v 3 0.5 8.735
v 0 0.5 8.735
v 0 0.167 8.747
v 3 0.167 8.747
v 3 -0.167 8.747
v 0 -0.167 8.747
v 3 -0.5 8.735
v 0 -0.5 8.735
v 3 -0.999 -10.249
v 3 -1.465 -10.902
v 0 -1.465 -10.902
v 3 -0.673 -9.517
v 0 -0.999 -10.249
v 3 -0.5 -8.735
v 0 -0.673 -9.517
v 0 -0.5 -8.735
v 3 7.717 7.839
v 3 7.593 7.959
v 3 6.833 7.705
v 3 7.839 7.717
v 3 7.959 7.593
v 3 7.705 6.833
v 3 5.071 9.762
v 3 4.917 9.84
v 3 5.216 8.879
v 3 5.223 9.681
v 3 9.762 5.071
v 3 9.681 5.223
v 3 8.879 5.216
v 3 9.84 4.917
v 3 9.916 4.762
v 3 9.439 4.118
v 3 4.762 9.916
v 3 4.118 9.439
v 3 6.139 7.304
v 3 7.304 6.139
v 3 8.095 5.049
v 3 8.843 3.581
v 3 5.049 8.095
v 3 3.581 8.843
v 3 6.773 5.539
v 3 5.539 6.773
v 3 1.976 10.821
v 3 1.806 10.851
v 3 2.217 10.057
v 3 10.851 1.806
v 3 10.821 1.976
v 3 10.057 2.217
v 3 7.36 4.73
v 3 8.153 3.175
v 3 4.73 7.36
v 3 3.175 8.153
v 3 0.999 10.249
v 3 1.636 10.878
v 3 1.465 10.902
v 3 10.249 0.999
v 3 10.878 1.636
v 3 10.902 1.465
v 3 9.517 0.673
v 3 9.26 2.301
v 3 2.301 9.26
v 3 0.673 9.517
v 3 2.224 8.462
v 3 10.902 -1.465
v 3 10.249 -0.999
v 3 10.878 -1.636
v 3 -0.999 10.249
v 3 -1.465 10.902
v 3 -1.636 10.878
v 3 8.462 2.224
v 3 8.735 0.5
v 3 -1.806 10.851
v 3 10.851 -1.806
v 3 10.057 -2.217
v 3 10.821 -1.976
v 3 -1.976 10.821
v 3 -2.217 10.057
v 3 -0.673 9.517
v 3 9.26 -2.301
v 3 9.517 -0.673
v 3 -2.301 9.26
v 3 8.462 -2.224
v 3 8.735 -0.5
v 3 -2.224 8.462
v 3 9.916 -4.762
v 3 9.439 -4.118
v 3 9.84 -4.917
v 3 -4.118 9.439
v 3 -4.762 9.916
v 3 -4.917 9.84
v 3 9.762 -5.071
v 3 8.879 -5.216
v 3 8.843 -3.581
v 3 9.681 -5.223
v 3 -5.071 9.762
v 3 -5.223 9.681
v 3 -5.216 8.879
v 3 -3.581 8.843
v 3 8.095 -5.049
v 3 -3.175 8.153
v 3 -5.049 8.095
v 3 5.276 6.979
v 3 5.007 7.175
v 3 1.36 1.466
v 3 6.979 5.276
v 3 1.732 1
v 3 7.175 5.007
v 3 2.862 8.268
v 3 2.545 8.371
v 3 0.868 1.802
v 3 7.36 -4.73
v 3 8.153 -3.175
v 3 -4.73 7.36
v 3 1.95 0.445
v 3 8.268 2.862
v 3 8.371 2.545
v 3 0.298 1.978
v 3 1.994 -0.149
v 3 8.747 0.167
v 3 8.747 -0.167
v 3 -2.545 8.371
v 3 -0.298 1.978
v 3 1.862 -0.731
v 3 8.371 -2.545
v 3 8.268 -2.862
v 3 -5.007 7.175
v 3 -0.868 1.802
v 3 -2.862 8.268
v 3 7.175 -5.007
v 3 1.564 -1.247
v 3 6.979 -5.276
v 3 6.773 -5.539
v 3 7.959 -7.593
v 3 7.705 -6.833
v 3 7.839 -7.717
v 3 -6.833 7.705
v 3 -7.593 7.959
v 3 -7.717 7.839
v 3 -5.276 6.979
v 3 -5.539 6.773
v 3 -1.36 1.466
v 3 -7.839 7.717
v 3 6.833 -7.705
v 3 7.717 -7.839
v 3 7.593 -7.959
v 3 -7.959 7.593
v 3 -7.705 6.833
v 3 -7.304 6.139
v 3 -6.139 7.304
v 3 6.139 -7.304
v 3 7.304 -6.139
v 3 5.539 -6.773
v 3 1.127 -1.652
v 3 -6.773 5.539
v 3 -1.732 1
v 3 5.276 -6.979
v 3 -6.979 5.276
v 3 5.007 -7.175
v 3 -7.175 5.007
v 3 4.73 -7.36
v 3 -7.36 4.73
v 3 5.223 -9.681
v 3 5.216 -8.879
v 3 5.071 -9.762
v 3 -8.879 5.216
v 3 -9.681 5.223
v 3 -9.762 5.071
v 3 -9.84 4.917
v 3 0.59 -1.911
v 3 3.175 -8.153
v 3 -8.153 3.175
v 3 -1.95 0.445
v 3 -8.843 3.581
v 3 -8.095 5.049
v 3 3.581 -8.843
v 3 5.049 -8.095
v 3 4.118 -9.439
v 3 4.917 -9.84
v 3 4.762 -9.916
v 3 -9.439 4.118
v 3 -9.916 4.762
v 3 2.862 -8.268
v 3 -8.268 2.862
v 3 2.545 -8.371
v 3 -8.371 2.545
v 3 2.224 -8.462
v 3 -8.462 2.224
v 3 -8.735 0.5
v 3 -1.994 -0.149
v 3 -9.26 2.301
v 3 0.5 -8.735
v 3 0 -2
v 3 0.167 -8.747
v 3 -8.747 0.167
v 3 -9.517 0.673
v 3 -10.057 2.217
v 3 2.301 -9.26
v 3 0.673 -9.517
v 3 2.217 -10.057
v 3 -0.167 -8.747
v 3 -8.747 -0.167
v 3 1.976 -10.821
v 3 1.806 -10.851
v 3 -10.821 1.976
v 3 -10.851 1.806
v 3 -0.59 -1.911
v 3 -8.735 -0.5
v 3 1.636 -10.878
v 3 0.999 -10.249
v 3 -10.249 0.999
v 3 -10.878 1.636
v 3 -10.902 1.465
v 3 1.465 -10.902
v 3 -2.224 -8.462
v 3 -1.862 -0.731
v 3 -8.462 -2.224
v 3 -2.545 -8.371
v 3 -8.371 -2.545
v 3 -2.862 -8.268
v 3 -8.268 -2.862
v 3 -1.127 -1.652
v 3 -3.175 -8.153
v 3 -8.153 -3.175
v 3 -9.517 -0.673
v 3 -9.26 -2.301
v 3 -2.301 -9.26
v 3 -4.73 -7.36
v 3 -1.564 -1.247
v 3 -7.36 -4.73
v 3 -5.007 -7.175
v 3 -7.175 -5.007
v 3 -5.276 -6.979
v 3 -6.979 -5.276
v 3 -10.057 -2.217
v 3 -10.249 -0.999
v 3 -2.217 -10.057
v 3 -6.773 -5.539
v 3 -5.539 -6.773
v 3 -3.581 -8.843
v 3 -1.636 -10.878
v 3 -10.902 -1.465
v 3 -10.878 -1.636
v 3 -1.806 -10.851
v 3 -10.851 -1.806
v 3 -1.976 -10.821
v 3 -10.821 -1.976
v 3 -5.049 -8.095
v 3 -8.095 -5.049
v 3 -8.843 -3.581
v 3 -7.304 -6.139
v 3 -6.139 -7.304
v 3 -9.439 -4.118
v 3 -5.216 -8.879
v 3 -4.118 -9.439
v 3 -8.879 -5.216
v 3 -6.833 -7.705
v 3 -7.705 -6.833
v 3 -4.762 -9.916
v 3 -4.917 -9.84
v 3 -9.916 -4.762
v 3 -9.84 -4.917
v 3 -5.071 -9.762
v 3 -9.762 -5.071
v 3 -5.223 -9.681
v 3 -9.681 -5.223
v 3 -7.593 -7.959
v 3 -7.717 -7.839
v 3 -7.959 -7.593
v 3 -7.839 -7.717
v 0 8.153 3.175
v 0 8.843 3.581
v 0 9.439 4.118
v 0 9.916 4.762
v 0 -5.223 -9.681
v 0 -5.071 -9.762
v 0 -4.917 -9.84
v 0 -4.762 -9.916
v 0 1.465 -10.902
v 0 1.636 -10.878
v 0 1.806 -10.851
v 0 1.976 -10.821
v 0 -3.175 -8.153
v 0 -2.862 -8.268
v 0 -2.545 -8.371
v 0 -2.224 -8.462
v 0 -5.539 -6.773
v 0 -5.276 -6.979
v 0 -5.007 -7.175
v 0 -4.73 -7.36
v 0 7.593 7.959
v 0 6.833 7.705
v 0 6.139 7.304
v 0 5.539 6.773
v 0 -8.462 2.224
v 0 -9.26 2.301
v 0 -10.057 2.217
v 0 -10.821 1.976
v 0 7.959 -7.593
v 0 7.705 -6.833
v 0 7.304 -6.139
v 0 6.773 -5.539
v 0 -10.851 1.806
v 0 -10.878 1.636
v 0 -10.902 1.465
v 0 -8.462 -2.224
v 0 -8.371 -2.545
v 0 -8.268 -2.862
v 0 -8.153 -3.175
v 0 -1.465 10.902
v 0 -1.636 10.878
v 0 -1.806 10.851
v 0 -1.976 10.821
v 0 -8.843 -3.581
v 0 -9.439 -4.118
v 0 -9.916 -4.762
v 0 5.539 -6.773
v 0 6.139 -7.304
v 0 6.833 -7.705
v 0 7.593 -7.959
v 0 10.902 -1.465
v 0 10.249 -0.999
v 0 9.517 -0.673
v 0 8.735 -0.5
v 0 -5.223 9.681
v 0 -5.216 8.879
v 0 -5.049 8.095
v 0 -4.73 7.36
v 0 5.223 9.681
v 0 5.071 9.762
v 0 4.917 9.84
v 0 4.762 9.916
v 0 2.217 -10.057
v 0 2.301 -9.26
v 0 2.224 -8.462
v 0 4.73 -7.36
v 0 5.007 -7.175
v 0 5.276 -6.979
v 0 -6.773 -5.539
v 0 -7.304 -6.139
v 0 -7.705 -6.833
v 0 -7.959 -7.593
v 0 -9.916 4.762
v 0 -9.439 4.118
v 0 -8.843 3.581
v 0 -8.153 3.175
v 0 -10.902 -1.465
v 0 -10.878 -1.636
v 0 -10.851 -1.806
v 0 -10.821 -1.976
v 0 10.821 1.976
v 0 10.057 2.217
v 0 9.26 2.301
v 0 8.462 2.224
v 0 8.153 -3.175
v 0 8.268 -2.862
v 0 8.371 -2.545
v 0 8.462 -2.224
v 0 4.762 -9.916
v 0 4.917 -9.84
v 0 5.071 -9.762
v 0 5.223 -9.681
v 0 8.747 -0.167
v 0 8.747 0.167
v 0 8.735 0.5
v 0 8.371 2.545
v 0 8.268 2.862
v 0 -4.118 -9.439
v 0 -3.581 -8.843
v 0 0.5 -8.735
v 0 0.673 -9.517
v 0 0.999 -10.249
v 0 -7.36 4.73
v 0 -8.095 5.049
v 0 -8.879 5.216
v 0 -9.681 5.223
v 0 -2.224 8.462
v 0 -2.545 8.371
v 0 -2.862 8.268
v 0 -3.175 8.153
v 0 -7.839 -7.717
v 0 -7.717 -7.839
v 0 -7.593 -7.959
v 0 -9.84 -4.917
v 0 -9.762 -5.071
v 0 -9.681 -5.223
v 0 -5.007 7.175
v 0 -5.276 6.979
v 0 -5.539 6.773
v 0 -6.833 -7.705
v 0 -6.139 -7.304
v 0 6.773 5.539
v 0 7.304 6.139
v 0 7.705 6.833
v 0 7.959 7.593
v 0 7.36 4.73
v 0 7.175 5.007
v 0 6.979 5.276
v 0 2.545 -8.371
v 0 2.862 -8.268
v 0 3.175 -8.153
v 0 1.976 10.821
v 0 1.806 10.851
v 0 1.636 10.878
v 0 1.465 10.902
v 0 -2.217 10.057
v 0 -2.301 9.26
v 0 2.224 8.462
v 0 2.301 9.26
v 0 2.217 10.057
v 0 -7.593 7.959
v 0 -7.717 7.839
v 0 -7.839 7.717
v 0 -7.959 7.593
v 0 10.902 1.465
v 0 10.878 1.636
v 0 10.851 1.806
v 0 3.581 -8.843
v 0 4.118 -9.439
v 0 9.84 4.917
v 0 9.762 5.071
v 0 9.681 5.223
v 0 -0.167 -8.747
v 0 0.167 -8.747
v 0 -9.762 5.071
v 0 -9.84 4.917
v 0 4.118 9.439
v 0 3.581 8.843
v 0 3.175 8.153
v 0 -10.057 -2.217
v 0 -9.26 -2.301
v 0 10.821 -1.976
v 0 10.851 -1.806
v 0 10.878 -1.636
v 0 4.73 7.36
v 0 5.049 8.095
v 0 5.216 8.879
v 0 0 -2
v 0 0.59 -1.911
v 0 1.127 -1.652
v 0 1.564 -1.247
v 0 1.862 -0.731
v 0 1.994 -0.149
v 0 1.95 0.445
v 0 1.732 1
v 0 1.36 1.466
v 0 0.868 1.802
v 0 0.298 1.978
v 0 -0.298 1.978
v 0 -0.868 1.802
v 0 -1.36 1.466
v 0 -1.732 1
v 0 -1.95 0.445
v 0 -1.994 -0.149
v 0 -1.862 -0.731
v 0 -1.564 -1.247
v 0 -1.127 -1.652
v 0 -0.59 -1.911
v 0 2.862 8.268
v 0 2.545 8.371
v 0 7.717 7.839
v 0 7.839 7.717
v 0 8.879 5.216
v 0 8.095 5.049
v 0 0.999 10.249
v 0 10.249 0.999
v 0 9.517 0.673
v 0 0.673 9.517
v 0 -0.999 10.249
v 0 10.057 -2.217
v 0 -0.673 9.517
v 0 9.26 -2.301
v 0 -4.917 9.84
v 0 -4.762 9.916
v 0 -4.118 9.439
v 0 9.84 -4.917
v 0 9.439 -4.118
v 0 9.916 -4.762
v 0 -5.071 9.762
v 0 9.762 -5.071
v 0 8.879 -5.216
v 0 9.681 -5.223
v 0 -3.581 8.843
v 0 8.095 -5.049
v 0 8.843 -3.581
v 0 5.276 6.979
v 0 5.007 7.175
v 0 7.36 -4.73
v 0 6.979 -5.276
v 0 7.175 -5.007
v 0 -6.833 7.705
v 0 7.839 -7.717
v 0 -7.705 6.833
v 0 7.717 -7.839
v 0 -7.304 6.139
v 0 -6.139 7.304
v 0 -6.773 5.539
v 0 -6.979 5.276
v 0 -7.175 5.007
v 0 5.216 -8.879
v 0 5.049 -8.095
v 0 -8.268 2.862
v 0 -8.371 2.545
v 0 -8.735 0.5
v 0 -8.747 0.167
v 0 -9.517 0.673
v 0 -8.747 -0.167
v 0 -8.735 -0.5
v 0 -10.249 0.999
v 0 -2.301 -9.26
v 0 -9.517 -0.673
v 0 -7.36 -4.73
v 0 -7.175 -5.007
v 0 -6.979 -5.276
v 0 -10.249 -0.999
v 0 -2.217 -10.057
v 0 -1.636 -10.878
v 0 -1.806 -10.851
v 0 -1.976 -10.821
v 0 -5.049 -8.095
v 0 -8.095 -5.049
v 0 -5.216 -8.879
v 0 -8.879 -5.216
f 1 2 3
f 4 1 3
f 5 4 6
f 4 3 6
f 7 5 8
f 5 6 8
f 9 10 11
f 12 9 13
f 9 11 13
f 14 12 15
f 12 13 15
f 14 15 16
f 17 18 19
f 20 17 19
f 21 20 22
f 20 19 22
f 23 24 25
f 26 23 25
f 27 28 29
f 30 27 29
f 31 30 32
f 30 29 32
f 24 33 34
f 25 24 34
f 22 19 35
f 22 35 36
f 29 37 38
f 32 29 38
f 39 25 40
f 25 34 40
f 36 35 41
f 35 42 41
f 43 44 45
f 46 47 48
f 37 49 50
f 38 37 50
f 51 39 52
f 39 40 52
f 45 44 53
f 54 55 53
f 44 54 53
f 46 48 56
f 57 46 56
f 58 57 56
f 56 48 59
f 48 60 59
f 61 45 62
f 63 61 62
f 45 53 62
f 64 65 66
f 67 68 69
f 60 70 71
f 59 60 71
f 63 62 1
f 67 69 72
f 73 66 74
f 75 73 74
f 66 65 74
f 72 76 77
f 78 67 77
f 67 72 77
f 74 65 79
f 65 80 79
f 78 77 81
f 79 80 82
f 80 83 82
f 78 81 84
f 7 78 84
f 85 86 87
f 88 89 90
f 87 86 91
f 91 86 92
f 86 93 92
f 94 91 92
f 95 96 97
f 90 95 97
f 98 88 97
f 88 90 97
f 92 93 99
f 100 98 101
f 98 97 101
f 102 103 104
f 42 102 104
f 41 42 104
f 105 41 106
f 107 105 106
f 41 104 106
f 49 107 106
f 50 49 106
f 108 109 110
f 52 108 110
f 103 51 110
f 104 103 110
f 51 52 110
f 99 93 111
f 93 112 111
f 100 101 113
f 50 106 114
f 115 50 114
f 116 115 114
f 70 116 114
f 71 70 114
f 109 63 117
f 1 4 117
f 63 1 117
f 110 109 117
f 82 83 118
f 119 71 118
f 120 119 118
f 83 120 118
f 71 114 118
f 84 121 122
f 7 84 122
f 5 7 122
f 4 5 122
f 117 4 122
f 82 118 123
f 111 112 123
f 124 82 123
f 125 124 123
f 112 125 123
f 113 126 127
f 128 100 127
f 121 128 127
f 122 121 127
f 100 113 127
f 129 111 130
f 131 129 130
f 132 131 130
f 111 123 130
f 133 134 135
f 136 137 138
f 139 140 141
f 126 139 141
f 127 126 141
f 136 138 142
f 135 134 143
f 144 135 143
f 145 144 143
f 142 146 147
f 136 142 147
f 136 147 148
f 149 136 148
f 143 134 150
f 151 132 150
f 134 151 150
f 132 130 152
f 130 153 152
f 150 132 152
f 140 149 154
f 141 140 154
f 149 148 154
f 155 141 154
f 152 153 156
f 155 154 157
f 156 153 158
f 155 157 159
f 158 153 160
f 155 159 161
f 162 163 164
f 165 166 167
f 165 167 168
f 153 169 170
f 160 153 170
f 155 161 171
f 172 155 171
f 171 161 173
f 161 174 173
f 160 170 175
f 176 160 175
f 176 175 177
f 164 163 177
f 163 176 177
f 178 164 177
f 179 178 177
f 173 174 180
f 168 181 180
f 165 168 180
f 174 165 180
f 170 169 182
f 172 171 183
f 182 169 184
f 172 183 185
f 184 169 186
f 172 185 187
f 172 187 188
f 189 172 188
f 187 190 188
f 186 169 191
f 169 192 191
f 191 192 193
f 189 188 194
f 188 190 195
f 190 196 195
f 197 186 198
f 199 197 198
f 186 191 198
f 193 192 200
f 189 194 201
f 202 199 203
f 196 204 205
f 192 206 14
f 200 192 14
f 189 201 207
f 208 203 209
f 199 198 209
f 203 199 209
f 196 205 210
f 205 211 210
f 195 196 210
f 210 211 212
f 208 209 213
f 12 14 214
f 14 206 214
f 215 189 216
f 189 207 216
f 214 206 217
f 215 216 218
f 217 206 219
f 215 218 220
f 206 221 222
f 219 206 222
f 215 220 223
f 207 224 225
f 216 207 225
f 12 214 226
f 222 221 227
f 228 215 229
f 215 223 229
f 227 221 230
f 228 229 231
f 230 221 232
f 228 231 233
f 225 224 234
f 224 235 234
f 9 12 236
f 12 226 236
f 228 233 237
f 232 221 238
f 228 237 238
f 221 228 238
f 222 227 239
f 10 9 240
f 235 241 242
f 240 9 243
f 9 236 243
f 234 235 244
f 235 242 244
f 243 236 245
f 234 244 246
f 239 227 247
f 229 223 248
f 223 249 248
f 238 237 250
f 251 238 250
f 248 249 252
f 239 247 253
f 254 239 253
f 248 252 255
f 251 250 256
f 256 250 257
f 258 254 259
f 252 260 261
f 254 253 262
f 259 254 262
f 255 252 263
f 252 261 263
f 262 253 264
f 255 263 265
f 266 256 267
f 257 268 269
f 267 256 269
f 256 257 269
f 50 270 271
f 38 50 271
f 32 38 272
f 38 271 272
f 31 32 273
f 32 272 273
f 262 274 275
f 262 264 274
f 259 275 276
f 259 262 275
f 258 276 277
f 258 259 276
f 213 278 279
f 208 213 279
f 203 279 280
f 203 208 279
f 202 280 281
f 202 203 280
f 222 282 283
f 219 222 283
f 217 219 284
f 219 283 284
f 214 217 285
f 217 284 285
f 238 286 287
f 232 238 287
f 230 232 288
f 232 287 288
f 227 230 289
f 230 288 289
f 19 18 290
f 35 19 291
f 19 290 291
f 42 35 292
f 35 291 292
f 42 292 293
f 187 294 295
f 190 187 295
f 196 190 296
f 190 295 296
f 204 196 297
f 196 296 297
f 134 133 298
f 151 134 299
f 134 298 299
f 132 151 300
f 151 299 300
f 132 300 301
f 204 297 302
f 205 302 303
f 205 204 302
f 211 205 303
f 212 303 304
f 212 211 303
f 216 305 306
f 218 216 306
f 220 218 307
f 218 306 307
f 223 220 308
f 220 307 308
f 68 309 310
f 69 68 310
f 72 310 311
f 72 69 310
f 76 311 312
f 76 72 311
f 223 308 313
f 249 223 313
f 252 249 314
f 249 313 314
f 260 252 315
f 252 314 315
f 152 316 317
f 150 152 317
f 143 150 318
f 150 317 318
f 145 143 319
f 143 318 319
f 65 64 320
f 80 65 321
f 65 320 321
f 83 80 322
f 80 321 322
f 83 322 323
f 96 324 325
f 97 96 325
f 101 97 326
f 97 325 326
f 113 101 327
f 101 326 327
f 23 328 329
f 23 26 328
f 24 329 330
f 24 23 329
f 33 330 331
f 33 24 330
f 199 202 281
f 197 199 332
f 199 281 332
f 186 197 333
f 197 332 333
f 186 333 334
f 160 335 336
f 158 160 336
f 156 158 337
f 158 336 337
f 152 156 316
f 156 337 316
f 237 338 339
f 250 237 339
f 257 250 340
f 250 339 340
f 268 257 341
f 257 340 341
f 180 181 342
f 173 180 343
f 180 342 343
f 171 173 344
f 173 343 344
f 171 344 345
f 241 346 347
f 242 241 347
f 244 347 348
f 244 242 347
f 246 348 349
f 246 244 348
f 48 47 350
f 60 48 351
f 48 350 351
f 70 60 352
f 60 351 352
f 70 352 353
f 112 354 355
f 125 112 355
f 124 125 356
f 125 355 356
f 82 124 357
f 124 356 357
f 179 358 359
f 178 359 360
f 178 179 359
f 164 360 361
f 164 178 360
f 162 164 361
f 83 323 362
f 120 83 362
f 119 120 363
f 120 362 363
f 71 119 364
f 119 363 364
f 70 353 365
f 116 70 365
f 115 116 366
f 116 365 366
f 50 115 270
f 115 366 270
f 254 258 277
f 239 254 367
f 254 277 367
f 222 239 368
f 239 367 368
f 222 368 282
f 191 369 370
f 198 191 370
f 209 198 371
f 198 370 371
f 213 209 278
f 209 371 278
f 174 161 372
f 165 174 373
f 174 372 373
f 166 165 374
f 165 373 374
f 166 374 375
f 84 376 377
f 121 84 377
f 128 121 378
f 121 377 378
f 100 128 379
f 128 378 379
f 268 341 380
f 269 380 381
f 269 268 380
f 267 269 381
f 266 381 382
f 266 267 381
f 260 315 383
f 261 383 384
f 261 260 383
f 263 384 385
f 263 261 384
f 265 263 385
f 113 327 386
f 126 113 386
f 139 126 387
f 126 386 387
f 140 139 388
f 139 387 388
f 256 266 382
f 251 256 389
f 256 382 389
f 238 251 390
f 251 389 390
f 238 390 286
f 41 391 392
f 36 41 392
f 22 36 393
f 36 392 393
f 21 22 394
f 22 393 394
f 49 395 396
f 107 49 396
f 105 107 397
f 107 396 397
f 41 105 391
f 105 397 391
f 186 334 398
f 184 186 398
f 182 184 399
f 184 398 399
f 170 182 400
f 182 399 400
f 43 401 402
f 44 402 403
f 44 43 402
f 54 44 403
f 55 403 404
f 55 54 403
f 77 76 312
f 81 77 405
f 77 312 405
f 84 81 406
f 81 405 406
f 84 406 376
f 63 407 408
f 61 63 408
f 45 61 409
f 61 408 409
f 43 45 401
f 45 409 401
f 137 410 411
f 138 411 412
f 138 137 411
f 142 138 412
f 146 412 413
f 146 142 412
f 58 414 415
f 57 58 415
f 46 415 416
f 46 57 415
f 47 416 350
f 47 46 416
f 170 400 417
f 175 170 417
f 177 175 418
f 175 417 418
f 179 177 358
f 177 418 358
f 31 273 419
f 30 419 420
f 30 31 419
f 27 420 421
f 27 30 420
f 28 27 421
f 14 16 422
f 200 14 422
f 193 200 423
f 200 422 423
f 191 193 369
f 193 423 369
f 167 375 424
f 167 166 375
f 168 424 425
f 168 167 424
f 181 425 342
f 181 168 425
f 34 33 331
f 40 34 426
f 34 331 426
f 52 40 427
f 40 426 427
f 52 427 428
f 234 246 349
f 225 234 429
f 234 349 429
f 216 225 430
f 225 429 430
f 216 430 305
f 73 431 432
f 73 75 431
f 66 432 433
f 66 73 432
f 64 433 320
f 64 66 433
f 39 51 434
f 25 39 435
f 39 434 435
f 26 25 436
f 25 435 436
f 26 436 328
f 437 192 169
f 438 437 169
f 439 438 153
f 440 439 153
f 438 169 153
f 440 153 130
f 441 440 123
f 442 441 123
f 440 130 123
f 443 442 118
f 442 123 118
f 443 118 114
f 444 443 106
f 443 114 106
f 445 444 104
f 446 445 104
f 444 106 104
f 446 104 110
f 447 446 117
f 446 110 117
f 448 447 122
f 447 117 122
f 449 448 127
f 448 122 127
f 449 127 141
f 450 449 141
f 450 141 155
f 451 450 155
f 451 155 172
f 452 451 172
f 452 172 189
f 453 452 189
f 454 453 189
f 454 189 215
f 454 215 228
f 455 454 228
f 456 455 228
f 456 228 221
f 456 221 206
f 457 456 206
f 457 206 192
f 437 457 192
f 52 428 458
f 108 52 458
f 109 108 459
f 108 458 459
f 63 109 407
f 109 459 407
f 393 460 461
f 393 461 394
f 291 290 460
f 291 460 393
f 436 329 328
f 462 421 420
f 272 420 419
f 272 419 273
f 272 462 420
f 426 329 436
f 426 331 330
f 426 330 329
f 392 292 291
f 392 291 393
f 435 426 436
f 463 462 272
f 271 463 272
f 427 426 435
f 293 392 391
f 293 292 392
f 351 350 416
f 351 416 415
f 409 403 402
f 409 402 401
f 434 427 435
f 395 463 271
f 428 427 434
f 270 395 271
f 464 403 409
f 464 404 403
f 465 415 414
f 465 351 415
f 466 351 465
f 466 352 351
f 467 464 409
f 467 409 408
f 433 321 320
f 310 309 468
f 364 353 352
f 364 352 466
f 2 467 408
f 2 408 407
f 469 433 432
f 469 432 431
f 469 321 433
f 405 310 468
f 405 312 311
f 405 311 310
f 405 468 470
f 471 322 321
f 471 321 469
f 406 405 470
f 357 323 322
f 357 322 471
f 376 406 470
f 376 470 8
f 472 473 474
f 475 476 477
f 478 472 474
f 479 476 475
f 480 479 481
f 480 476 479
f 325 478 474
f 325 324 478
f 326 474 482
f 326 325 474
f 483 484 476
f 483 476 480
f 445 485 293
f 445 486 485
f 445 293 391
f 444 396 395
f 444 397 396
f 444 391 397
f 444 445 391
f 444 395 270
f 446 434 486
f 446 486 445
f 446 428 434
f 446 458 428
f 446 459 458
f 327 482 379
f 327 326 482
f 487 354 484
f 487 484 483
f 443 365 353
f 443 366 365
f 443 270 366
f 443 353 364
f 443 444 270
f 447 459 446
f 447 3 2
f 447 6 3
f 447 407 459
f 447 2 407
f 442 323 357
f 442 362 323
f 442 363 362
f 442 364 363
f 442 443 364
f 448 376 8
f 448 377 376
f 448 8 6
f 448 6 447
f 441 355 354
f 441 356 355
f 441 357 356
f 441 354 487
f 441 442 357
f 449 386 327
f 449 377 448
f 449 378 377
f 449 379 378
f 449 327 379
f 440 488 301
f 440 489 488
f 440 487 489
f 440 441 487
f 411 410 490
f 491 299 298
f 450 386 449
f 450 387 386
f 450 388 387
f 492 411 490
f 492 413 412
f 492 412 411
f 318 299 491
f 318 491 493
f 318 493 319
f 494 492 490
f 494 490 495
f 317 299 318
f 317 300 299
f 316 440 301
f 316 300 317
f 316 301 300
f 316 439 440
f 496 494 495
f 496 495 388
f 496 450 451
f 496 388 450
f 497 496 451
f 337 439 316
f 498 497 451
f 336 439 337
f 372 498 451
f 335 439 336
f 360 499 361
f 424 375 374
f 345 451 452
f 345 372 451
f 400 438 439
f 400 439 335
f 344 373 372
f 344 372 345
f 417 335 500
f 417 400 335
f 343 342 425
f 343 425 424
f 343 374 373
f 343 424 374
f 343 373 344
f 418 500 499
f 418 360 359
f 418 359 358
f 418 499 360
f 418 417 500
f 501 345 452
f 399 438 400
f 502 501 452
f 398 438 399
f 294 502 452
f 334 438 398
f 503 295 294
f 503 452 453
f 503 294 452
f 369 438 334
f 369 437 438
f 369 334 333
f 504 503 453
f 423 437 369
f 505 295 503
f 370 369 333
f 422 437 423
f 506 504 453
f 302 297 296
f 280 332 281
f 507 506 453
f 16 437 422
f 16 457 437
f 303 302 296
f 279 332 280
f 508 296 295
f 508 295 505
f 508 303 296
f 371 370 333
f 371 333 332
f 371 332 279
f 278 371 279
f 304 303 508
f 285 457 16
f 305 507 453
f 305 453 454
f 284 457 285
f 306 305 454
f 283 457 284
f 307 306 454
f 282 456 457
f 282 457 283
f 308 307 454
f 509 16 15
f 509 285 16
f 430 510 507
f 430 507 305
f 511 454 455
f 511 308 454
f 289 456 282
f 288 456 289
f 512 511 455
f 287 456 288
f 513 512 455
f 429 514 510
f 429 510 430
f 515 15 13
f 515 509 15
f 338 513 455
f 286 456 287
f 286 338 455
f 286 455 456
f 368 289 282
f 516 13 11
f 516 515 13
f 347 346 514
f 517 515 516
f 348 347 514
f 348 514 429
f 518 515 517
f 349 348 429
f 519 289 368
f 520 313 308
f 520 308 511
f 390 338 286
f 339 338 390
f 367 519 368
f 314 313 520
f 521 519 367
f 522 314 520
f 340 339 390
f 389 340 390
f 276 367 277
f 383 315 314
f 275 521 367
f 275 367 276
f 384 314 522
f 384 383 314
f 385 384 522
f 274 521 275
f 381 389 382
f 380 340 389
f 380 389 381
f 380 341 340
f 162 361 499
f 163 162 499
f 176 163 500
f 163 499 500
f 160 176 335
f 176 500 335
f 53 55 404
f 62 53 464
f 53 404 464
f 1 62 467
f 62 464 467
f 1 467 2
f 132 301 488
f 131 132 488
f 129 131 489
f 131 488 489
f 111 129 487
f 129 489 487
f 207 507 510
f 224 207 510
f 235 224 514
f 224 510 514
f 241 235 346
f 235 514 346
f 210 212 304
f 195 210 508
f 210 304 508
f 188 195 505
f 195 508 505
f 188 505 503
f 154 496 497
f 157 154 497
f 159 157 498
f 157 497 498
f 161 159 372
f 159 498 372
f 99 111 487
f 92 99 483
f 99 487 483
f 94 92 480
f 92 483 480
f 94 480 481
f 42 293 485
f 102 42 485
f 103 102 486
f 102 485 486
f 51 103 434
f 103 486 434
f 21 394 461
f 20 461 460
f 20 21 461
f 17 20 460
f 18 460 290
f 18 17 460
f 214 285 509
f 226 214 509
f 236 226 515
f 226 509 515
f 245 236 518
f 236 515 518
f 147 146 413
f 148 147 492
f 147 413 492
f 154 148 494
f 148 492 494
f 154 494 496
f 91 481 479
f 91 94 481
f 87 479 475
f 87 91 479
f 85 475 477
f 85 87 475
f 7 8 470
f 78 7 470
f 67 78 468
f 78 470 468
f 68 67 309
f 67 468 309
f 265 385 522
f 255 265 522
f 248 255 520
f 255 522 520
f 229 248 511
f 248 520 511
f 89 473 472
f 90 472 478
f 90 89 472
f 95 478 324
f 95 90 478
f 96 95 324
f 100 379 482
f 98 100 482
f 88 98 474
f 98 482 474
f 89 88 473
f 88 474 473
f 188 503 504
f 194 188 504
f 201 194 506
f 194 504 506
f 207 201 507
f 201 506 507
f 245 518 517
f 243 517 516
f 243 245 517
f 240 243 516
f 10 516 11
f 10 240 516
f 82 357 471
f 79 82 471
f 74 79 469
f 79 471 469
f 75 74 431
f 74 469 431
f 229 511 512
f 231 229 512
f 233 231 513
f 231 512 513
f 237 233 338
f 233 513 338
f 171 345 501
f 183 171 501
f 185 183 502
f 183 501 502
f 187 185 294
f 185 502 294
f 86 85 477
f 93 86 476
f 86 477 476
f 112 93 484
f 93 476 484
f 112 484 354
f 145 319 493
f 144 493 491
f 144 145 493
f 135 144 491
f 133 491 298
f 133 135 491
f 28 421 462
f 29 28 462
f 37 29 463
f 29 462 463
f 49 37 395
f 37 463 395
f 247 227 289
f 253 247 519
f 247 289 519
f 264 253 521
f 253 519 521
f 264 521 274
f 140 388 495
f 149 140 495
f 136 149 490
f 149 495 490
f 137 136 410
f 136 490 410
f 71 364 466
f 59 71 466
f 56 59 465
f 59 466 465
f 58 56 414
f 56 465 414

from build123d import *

# Parameters (mm, degrees)
BASPROSKE_W        = 3
BASPROSKE_H        = 11
TOOTHCUT_DEPTH     = 16.842979518
TEETHCUTS_COUNT    = 20
TEETHCUTS_ANGLE    = 342
BORSKE_R           = 1.5
BORE_DEPTH         = 50.0000508
SKETCH1_R          = 2
CUT_EXTRUDE1_DEPTH = 16.706934942


with BuildPart() as part:
    # BasProSke → Base-Revolve (revolve)
    with BuildSketch(Plane(origin=(0, 0, 0), x_dir=(1, 0, 0), z_dir=(0, 1, 0)), mode=Mode.PRIVATE) as base_revolve_sk:
        with Locations((1.5, 5.5)):
            Rectangle(BASPROSKE_W, BASPROSKE_H)
    revolve(base_revolve_sk.sketch.rotate(Axis((-10, 0, 0), (1, 0, 0)), 180), axis=Axis((-10, 0, 0), (1, 0, 0)))

    # TooCutSke → ToothCut (cut, through all)
    with BuildSketch(Plane(origin=(0, 0, 0), x_dir=(0, 0, -1), z_dir=(1, 0, 0))):
        with BuildLine():
            ThreePointArc((0.499924007, 8.734705318), (0, 8.749), (-0.499924007, 8.734705318))
            ThreePointArc((-0.499924007, 8.734705318), (-0.824302243, 9.905497836), (-1.485192705, 10.924909509))
            ThreePointArc((-1.485192705, 10.924909509), (0, 11.0254), (1.485192705, 10.924909509))
            ThreePointArc((1.485192705, 10.924909509), (0.824302243, 9.905497836), (0.499924007, 8.734705318))
        make_face()
    toothcut = extrude(amount=TOOTHCUT_DEPTH, mode=Mode.SUBTRACT)

    # TeethCuts: ToothCut ×20 about axis
    teethcuts_axis = Axis((-10, 0, 0), (1, 0, 0))
    for i in range(1, TEETHCUTS_COUNT):
        add(toothcut.rotate(teethcuts_axis, i * TEETHCUTS_ANGLE / (TEETHCUTS_COUNT - 1)), mode=Mode.SUBTRACT)

    # BorSke → Bore (cut, symmetric)
    with BuildSketch(Plane(origin=(0, 0, 0), x_dir=(0, 0, -1), z_dir=(1, 0, 0))):
        with Locations(Location((0, 0, 0), (0, 0, 180))):
            Circle(BORSKE_R)
    extrude(amount=BORE_DEPTH, both=True, mode=Mode.SUBTRACT)

    # Sketch1 → Cut-Extrude1 (cut, through all)
    with BuildSketch(Plane(origin=(3, 0, 0), x_dir=(0, 0, -1), z_dir=(1, 0, 0))):
        Circle(SKETCH1_R)
    extrude(amount=-CUT_EXTRUDE1_DEPTH, mode=Mode.SUBTRACT)


solid = part.part
